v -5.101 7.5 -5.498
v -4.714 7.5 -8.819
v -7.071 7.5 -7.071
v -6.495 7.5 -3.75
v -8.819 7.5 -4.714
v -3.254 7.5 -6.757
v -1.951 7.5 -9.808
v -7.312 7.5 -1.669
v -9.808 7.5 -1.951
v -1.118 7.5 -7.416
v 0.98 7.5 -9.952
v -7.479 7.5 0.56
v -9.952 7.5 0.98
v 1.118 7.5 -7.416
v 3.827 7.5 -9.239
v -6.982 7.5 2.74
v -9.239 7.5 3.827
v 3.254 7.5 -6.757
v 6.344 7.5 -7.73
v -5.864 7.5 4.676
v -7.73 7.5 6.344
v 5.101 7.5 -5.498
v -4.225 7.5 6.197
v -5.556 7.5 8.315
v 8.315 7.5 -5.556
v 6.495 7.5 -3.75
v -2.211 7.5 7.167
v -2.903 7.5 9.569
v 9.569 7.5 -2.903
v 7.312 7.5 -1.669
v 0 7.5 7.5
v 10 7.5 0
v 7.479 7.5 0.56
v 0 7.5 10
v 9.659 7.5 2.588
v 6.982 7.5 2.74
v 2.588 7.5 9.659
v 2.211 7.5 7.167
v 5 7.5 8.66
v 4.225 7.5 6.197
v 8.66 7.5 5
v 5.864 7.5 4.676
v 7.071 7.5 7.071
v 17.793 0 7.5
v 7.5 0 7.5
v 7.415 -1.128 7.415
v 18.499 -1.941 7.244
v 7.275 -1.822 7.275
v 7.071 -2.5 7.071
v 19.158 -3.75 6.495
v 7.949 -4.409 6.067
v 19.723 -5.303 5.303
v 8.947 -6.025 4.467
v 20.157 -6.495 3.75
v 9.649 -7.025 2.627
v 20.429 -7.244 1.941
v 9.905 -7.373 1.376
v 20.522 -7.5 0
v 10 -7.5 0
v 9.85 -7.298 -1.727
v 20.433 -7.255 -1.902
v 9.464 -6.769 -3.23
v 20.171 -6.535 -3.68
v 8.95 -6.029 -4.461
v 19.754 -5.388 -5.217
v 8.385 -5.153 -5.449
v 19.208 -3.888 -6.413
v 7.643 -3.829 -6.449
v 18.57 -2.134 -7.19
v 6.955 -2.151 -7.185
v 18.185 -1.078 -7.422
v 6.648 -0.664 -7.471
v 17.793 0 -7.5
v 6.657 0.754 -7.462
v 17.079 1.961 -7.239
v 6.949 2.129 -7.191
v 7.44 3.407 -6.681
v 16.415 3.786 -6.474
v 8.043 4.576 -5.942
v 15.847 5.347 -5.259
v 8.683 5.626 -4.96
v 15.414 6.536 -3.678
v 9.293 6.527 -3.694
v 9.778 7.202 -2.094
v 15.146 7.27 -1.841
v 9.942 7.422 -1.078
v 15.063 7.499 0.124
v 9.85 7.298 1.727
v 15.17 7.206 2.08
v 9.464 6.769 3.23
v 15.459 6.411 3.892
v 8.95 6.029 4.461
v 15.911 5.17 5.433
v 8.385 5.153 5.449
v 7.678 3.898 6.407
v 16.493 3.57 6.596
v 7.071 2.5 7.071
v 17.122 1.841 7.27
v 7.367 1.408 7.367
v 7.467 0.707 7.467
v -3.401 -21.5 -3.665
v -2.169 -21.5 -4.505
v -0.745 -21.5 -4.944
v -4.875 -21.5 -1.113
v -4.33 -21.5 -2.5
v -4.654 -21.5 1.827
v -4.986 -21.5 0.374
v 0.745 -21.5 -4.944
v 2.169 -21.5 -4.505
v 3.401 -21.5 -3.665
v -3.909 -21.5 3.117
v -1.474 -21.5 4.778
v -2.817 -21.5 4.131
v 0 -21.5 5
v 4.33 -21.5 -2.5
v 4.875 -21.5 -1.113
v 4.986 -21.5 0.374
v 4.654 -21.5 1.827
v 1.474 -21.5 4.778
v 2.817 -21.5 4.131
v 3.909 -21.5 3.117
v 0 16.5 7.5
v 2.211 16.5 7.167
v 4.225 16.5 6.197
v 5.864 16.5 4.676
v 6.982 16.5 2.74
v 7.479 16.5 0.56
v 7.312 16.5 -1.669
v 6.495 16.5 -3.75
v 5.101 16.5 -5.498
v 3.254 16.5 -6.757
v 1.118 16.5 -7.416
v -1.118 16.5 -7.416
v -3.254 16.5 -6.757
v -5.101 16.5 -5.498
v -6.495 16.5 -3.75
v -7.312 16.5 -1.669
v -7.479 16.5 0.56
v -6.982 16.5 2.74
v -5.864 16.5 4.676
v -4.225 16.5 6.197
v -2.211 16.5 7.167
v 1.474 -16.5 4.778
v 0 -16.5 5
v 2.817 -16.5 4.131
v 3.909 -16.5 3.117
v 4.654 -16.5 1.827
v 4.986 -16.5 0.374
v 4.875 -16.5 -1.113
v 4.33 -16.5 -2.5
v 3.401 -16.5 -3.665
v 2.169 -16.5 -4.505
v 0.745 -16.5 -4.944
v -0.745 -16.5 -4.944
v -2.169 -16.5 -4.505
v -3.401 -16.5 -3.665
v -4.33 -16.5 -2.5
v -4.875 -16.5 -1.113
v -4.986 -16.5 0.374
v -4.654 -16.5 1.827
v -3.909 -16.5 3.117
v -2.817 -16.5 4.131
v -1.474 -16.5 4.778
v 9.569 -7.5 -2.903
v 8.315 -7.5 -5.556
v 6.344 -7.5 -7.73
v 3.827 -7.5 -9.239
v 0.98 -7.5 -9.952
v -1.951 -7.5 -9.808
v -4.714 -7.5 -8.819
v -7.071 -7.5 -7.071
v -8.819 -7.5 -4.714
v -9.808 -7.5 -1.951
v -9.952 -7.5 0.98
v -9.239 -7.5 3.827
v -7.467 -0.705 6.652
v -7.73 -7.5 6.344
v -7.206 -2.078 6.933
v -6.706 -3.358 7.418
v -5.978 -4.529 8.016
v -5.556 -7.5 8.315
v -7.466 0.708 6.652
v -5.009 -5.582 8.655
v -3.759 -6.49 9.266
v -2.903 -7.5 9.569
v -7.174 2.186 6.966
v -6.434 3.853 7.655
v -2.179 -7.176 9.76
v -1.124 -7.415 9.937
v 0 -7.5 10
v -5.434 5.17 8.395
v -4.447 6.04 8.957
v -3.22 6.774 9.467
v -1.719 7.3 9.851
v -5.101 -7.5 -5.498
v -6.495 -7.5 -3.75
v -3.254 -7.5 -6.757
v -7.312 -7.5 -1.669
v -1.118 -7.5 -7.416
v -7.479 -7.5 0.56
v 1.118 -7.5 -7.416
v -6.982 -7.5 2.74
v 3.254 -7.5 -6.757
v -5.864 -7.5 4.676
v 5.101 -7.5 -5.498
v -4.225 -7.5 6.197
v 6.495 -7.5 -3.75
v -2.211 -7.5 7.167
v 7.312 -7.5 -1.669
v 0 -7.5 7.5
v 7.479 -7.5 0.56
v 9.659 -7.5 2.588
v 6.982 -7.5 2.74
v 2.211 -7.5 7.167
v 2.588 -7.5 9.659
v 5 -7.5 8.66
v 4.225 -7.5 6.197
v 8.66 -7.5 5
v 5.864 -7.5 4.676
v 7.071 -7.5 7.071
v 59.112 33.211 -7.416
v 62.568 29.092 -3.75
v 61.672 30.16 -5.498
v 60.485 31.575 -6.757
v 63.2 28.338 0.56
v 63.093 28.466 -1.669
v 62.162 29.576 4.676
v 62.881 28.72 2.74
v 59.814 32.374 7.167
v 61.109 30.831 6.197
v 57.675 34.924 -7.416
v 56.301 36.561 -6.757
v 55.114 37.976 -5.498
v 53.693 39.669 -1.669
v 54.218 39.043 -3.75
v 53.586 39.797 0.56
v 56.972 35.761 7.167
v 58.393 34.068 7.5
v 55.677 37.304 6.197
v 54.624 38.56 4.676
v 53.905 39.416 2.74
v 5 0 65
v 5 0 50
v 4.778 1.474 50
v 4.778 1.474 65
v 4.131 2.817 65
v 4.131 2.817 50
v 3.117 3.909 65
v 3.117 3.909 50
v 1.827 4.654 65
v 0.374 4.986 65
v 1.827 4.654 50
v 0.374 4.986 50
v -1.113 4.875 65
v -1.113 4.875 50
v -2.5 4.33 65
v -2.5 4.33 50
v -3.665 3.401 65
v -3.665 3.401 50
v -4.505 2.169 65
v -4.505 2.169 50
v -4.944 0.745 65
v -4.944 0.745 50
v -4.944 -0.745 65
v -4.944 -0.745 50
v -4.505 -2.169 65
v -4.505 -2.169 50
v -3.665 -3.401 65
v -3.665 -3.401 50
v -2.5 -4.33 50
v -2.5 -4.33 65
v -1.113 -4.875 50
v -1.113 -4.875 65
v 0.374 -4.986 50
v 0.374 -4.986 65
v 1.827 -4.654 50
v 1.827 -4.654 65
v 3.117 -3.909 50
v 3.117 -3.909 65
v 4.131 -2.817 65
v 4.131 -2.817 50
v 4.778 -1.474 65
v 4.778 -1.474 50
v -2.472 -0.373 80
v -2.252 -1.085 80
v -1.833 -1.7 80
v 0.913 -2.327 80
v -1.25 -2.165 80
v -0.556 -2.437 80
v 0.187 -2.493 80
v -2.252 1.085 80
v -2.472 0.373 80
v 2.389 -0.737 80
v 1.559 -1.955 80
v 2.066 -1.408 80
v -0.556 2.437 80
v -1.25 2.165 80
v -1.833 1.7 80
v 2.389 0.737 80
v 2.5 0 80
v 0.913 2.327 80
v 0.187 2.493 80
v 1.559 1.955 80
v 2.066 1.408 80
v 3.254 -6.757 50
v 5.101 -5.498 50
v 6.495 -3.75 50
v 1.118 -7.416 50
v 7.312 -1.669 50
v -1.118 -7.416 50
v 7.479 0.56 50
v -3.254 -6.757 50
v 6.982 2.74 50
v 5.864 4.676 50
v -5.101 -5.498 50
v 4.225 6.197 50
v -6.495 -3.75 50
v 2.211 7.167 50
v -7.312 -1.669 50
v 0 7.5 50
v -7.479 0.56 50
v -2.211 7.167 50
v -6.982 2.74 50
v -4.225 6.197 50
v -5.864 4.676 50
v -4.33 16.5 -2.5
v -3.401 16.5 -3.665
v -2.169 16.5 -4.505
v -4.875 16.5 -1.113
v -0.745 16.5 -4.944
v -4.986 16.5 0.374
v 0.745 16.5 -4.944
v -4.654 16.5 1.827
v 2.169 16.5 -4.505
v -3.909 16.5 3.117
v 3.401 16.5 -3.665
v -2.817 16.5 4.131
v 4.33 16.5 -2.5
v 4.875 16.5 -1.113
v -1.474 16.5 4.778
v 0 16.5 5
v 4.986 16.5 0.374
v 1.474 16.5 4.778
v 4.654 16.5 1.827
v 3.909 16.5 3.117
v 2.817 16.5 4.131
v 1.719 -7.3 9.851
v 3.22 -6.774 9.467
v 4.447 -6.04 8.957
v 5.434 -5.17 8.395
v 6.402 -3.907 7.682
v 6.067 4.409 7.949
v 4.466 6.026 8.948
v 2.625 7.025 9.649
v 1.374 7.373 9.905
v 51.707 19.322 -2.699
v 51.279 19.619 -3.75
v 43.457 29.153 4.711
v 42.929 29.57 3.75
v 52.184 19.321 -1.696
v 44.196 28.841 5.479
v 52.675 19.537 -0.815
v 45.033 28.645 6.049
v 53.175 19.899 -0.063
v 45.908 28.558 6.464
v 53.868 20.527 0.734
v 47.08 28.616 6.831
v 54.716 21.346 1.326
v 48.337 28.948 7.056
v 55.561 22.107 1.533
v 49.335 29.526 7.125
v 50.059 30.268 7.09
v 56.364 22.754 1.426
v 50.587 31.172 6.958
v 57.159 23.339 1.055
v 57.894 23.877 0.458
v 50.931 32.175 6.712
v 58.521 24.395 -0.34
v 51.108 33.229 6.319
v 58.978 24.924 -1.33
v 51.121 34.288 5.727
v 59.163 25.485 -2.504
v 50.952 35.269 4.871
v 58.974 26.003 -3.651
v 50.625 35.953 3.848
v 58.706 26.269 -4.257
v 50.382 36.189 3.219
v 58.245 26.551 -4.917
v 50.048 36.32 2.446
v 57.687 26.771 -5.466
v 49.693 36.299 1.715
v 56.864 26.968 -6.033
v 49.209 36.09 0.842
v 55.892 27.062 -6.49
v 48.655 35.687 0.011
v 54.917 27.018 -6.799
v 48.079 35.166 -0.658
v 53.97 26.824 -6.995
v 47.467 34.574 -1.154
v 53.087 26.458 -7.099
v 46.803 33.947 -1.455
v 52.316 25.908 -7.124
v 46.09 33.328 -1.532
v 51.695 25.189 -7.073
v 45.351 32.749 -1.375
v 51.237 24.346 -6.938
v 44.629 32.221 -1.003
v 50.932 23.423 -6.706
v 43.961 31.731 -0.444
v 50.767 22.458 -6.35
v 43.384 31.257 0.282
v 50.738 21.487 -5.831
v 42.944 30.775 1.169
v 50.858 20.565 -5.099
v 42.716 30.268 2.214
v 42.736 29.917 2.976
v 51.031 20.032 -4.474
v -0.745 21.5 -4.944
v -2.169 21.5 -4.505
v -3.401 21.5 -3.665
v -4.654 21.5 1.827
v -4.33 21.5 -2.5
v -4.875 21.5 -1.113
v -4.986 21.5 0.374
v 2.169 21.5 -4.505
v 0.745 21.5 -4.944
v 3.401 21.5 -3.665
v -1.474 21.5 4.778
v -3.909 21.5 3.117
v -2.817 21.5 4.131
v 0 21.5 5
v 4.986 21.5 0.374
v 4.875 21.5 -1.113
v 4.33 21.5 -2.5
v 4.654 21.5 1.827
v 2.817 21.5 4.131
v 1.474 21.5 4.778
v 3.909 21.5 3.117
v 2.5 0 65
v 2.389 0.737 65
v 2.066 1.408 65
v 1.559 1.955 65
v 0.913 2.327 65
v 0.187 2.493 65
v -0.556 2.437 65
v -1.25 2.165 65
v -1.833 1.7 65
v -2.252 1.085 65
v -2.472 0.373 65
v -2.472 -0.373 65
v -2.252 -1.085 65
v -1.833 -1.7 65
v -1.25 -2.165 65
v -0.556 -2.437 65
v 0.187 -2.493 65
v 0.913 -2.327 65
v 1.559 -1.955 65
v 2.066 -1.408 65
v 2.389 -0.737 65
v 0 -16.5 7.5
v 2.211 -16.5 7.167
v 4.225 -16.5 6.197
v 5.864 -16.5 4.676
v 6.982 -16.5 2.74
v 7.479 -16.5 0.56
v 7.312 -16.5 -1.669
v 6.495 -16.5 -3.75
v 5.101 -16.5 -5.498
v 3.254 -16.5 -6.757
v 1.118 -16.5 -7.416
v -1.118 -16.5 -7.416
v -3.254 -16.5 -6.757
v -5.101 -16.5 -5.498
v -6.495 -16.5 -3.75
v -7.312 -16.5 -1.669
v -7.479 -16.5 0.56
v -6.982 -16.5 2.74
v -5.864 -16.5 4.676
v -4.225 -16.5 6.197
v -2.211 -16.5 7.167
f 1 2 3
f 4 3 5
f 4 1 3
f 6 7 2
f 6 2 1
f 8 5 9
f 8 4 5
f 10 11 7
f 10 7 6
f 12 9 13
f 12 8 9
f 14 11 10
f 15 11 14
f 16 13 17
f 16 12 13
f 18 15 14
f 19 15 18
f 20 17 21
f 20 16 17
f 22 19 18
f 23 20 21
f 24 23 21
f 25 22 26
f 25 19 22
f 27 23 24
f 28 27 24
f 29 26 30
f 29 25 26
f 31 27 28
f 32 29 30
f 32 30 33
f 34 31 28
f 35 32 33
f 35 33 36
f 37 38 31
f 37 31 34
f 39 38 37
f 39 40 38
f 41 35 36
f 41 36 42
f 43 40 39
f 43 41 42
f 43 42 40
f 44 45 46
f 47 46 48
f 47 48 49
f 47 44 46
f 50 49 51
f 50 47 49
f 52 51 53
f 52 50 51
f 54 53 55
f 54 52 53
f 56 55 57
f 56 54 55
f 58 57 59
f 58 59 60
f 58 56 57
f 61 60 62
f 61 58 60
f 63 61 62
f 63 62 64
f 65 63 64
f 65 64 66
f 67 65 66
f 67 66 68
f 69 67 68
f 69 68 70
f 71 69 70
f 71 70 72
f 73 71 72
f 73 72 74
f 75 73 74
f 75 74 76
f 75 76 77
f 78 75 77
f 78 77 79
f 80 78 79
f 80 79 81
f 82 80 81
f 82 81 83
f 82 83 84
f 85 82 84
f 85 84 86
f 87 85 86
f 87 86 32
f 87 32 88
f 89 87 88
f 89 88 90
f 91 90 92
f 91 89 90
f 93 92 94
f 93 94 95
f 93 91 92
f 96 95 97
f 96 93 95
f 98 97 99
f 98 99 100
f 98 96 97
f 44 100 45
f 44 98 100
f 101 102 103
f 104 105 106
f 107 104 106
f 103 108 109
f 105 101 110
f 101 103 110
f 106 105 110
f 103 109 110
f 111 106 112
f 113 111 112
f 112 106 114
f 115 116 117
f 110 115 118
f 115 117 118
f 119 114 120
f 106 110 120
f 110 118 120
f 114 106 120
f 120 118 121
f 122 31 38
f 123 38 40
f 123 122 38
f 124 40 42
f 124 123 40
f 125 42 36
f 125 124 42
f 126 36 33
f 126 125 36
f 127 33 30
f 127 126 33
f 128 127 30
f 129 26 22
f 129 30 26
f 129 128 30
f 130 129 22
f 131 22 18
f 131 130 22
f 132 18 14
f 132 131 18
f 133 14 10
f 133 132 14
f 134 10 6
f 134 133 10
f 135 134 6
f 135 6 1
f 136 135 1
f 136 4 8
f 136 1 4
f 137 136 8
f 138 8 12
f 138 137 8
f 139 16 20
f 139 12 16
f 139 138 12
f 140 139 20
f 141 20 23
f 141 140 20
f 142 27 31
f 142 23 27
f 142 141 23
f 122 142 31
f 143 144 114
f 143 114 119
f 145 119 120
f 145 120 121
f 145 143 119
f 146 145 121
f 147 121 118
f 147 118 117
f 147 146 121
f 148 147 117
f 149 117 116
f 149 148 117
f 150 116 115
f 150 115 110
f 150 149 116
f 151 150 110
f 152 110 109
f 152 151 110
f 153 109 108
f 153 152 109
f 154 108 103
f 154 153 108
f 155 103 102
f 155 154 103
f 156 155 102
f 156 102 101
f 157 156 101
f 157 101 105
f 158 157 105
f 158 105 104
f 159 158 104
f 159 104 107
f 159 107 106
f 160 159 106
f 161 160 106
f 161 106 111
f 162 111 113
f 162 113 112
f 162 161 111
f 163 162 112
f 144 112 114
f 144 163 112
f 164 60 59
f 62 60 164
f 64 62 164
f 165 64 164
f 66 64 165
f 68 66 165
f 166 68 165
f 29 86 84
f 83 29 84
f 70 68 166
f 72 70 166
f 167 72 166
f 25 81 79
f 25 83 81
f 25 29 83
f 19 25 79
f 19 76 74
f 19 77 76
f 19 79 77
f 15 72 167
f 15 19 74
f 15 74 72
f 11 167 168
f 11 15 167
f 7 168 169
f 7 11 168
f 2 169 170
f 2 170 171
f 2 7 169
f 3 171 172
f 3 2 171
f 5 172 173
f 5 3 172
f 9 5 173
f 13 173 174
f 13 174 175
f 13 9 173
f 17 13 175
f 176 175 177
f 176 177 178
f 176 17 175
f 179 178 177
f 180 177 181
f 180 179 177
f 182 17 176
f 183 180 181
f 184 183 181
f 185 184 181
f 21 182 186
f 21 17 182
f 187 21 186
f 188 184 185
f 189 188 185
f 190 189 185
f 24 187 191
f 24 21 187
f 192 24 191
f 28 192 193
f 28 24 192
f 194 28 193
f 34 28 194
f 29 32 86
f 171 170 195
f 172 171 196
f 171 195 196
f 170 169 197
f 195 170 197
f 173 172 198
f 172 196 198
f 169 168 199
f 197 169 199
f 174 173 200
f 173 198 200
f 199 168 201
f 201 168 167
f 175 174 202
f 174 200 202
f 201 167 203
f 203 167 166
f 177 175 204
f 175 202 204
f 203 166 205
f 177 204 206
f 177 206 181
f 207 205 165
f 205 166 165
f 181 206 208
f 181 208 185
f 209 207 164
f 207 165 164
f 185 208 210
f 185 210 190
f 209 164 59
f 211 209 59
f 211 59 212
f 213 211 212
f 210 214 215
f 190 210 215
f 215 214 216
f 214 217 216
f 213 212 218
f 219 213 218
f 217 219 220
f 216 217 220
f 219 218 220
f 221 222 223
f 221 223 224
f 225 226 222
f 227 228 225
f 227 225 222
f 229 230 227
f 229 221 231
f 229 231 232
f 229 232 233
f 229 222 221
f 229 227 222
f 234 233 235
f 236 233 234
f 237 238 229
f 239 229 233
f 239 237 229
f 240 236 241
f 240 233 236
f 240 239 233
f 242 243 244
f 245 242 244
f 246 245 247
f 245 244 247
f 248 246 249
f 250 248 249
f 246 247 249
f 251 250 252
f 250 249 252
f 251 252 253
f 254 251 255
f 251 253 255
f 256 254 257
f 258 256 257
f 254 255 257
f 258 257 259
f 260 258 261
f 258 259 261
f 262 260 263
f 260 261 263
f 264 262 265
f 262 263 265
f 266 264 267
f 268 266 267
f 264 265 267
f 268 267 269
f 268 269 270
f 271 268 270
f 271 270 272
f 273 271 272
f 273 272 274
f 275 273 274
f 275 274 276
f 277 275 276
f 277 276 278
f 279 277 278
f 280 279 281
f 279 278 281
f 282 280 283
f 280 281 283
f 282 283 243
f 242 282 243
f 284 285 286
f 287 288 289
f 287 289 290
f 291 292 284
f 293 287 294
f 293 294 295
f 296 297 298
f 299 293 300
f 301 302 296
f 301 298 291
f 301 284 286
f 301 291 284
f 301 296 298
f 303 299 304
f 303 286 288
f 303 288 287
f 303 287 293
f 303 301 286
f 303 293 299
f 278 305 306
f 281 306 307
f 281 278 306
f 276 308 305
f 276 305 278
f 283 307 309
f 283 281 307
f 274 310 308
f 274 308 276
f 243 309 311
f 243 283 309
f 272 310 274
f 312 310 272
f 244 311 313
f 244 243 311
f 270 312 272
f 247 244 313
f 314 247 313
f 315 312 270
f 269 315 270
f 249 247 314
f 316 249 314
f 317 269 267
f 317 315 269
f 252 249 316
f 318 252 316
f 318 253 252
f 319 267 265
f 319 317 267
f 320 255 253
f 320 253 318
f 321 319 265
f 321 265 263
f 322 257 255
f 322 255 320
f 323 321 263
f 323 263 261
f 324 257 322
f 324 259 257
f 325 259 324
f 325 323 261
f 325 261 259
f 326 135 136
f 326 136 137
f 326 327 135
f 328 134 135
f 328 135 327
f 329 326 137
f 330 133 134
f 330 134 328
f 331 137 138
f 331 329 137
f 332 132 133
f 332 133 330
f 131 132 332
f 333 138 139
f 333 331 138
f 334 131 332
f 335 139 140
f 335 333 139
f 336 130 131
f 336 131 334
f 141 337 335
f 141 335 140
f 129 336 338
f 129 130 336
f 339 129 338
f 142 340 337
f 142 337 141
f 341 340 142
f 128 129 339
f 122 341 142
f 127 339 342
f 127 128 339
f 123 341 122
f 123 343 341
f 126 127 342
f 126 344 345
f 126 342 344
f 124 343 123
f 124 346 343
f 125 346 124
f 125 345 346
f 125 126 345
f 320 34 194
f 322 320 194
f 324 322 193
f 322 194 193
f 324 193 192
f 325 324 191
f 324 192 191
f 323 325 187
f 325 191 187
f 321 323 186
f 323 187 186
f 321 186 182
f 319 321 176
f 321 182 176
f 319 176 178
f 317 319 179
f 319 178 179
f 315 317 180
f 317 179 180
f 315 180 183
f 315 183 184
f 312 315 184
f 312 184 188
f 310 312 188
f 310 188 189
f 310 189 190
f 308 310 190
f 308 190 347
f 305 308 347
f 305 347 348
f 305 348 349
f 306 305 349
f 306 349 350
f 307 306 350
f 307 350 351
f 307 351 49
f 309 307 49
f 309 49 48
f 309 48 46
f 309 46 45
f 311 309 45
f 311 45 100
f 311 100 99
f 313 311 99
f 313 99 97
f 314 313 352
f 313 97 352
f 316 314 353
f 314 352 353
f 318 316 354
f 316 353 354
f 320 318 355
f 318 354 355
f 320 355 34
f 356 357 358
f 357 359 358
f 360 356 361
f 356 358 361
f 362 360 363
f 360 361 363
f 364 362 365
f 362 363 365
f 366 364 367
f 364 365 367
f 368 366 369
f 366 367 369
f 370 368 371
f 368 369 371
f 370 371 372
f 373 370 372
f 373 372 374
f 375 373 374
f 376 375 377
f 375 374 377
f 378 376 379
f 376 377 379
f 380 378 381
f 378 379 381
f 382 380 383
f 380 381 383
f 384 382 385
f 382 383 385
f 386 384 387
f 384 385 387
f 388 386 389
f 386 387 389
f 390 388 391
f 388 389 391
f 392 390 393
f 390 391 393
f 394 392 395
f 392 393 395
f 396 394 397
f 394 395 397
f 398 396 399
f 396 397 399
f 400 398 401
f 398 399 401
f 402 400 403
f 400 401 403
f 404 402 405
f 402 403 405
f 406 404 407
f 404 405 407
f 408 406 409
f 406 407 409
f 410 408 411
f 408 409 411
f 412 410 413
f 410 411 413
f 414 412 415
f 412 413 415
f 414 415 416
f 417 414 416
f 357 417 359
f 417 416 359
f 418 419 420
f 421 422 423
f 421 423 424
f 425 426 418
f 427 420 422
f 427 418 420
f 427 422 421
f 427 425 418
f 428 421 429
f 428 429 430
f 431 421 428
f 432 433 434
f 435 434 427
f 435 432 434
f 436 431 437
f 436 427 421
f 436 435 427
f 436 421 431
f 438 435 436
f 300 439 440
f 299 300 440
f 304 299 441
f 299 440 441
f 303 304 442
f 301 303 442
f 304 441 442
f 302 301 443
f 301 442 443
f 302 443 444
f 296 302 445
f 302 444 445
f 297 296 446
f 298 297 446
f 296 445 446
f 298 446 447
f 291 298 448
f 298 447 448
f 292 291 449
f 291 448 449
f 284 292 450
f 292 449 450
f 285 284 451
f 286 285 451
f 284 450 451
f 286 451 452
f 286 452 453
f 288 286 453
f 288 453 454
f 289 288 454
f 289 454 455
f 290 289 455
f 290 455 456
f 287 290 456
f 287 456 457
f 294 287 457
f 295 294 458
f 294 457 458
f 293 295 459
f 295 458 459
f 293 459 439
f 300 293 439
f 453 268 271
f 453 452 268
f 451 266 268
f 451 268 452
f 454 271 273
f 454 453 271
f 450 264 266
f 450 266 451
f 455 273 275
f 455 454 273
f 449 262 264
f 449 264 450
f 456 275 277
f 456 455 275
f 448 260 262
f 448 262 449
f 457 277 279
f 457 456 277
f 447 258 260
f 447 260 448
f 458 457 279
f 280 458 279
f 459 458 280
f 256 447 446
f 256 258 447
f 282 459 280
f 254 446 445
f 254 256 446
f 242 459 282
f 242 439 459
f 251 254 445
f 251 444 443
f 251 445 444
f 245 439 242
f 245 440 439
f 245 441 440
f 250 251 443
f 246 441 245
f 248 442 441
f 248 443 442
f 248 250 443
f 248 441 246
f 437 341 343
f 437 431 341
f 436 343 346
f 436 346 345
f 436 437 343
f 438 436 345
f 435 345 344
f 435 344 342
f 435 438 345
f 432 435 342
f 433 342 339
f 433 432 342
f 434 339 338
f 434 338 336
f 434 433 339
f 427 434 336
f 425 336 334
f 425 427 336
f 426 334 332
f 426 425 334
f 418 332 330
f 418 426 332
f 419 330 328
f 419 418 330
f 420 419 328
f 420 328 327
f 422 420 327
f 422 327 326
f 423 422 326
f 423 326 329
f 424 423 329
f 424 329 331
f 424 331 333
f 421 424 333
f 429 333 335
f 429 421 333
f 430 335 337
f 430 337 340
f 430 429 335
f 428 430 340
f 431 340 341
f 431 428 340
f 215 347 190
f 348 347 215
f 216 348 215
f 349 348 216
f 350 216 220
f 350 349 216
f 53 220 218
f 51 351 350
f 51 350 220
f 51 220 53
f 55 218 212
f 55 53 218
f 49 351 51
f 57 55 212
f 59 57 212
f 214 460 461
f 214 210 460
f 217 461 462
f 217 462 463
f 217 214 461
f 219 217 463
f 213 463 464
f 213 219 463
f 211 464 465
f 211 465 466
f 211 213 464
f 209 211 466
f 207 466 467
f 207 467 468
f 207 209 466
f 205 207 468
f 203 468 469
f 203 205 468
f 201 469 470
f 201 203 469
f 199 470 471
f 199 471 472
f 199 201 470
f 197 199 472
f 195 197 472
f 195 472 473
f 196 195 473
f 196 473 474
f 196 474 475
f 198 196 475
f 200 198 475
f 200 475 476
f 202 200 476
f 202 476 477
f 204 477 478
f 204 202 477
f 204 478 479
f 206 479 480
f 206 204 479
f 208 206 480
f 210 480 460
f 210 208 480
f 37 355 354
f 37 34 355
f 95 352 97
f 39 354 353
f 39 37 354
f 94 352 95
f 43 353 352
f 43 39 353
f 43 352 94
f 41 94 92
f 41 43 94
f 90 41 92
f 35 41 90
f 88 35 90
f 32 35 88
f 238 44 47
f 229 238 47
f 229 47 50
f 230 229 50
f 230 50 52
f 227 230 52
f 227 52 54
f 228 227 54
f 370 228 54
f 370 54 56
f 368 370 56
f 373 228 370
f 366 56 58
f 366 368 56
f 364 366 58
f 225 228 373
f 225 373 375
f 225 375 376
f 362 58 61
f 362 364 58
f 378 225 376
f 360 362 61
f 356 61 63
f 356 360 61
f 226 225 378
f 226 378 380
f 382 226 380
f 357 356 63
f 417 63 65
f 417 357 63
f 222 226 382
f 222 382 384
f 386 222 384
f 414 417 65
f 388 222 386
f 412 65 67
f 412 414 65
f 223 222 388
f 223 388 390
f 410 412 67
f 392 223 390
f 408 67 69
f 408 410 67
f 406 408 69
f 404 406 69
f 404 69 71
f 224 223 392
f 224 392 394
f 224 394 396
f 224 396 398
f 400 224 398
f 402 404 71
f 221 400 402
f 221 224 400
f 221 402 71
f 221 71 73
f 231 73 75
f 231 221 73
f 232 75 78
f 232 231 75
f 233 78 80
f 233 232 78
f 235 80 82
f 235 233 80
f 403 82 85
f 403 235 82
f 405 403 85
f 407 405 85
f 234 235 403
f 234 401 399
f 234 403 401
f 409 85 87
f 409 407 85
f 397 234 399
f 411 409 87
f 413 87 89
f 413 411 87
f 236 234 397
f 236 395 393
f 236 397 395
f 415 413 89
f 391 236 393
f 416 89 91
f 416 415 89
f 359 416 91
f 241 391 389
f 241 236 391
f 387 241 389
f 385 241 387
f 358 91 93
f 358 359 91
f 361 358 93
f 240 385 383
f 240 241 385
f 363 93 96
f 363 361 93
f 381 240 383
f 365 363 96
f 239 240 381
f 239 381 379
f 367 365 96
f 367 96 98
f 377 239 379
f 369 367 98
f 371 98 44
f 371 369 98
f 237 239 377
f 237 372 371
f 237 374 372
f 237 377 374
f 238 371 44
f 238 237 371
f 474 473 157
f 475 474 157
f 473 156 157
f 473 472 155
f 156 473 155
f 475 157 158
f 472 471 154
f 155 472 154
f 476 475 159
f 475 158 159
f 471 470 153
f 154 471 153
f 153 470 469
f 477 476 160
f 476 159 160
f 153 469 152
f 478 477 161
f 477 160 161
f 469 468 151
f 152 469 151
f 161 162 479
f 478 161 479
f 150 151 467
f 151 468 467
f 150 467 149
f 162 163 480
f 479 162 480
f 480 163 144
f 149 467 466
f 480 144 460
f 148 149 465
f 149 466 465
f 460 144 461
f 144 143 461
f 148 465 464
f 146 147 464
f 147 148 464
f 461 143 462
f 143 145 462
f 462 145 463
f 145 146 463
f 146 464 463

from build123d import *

# Parameters (mm, degrees)
IZIM2_R                     = 5
Y_KSEKLIK_EKSTR_ZYON2_DEPTH = 21.5
IZIM2_5_R                   = 7.5
IZIM2_5_R_2                 = 5
Y_KSEKLIK_EKSTR_ZYON3_DEPTH = 16.5
IZIM18_R                    = 10
Y_KSEKLIK_EKSTR_ZYON6_DEPTH = 7.5
IZIM3_R                     = 7.5
Y_KSEKLIK_EKSTR_ZYON4_DEPTH = 50
S_P_R4_PROFILE_R            = 7.5
IZIM42_R                    = 5
KES_EKSTR_ZYON5_DEPTH       = 10
IZIM43_R                    = 5
Y_KSEKLIK_EKSTR_ZYON7_DEPTH = 15
IZIM44_R                    = 2.5
Y_KSEKLIK_EKSTR_ZYON8_DEPTH = 15


with BuildPart() as part:
    # Çizim2 → Yükseklik-Ekstrüzyon2 (new, symmetric)
    with BuildSketch(Plane(origin=(0, 0, 0), x_dir=(1, 0, 0), z_dir=(0, 1, 0))):
        Circle(IZIM2_R)
    extrude(amount=Y_KSEKLIK_EKSTR_ZYON2_DEPTH, both=True)

    # Çizim2<5> → Yükseklik-Ekstrüzyon3 (add, symmetric)
    with BuildSketch(Plane(origin=(0, 0, 0), x_dir=(1, 0, 0), z_dir=(0, 1, 0))):
        Circle(IZIM2_5_R)
        Circle(IZIM2_5_R_2, mode=Mode.SUBTRACT)
    extrude(amount=Y_KSEKLIK_EKSTR_ZYON3_DEPTH, both=True)

    # Çizim18 → Yükseklik-Ekstrüzyon6 (add, symmetric)
    with BuildSketch(Plane(origin=(0, 0, 0), x_dir=(1, 0, 0), z_dir=(0, 1, 0))):
        Circle(IZIM18_R)
    extrude(amount=Y_KSEKLIK_EKSTR_ZYON6_DEPTH, both=True)

    # Çizim3 → Yükseklik-Ekstrüzyon4 (add)
    with BuildSketch(Plane.XY):
        Circle(IZIM3_R)
    extrude(amount=Y_KSEKLIK_EKSTR_ZYON4_DEPTH)

    # Süpür4: sweep along a path in Çizim22
    with BuildLine(Plane.XY) as s_p_r4_path:
        Line((0, 0), (17.792695878, 0))
        Line((17.792695878, 0), (58.393051363, 34.067743313))
    # Süpür4 profile (on start of the path) → Süpür4 (sweep)
    with BuildSketch(Plane(origin=(0, 0, 0), x_dir=(0, 0, 1), z_dir=(1, 0, 0))):
        Circle(S_P_R4_PROFILE_R)
    sweep(path=s_p_r4_path.line, transition=Transition.RIGHT)

    # Çizim42 → Kes-Ekstrüzyon5 (cut, symmetric)
    with BuildSketch(Plane(origin=(5.513634999, -6.570894318, -4.952333559), x_dir=(0.8267965189633342, 0.3839166530668254, 0.411114971422934), z_dir=(-0.5566703992264205, 0.6634139481689367, 0.500000000000001))):
        with Locations((52.788286905, 21.97481992)):
            Circle(IZIM42_R)
    extrude(amount=KES_EKSTR_ZYON5_DEPTH, both=True, mode=Mode.SUBTRACT)

    # Çizim43 → Yükseklik-Ekstrüzyon7 (add)
    with BuildSketch(Plane.XY.offset(50)):
        Circle(IZIM43_R)
    extrude(amount=Y_KSEKLIK_EKSTR_ZYON7_DEPTH)

    # Çizim44 → Yükseklik-Ekstrüzyon8 (add)
    with BuildSketch(Plane.XY.offset(65)):
        Circle(IZIM44_R)
    extrude(amount=Y_KSEKLIK_EKSTR_ZYON8_DEPTH)


solid = part.part
